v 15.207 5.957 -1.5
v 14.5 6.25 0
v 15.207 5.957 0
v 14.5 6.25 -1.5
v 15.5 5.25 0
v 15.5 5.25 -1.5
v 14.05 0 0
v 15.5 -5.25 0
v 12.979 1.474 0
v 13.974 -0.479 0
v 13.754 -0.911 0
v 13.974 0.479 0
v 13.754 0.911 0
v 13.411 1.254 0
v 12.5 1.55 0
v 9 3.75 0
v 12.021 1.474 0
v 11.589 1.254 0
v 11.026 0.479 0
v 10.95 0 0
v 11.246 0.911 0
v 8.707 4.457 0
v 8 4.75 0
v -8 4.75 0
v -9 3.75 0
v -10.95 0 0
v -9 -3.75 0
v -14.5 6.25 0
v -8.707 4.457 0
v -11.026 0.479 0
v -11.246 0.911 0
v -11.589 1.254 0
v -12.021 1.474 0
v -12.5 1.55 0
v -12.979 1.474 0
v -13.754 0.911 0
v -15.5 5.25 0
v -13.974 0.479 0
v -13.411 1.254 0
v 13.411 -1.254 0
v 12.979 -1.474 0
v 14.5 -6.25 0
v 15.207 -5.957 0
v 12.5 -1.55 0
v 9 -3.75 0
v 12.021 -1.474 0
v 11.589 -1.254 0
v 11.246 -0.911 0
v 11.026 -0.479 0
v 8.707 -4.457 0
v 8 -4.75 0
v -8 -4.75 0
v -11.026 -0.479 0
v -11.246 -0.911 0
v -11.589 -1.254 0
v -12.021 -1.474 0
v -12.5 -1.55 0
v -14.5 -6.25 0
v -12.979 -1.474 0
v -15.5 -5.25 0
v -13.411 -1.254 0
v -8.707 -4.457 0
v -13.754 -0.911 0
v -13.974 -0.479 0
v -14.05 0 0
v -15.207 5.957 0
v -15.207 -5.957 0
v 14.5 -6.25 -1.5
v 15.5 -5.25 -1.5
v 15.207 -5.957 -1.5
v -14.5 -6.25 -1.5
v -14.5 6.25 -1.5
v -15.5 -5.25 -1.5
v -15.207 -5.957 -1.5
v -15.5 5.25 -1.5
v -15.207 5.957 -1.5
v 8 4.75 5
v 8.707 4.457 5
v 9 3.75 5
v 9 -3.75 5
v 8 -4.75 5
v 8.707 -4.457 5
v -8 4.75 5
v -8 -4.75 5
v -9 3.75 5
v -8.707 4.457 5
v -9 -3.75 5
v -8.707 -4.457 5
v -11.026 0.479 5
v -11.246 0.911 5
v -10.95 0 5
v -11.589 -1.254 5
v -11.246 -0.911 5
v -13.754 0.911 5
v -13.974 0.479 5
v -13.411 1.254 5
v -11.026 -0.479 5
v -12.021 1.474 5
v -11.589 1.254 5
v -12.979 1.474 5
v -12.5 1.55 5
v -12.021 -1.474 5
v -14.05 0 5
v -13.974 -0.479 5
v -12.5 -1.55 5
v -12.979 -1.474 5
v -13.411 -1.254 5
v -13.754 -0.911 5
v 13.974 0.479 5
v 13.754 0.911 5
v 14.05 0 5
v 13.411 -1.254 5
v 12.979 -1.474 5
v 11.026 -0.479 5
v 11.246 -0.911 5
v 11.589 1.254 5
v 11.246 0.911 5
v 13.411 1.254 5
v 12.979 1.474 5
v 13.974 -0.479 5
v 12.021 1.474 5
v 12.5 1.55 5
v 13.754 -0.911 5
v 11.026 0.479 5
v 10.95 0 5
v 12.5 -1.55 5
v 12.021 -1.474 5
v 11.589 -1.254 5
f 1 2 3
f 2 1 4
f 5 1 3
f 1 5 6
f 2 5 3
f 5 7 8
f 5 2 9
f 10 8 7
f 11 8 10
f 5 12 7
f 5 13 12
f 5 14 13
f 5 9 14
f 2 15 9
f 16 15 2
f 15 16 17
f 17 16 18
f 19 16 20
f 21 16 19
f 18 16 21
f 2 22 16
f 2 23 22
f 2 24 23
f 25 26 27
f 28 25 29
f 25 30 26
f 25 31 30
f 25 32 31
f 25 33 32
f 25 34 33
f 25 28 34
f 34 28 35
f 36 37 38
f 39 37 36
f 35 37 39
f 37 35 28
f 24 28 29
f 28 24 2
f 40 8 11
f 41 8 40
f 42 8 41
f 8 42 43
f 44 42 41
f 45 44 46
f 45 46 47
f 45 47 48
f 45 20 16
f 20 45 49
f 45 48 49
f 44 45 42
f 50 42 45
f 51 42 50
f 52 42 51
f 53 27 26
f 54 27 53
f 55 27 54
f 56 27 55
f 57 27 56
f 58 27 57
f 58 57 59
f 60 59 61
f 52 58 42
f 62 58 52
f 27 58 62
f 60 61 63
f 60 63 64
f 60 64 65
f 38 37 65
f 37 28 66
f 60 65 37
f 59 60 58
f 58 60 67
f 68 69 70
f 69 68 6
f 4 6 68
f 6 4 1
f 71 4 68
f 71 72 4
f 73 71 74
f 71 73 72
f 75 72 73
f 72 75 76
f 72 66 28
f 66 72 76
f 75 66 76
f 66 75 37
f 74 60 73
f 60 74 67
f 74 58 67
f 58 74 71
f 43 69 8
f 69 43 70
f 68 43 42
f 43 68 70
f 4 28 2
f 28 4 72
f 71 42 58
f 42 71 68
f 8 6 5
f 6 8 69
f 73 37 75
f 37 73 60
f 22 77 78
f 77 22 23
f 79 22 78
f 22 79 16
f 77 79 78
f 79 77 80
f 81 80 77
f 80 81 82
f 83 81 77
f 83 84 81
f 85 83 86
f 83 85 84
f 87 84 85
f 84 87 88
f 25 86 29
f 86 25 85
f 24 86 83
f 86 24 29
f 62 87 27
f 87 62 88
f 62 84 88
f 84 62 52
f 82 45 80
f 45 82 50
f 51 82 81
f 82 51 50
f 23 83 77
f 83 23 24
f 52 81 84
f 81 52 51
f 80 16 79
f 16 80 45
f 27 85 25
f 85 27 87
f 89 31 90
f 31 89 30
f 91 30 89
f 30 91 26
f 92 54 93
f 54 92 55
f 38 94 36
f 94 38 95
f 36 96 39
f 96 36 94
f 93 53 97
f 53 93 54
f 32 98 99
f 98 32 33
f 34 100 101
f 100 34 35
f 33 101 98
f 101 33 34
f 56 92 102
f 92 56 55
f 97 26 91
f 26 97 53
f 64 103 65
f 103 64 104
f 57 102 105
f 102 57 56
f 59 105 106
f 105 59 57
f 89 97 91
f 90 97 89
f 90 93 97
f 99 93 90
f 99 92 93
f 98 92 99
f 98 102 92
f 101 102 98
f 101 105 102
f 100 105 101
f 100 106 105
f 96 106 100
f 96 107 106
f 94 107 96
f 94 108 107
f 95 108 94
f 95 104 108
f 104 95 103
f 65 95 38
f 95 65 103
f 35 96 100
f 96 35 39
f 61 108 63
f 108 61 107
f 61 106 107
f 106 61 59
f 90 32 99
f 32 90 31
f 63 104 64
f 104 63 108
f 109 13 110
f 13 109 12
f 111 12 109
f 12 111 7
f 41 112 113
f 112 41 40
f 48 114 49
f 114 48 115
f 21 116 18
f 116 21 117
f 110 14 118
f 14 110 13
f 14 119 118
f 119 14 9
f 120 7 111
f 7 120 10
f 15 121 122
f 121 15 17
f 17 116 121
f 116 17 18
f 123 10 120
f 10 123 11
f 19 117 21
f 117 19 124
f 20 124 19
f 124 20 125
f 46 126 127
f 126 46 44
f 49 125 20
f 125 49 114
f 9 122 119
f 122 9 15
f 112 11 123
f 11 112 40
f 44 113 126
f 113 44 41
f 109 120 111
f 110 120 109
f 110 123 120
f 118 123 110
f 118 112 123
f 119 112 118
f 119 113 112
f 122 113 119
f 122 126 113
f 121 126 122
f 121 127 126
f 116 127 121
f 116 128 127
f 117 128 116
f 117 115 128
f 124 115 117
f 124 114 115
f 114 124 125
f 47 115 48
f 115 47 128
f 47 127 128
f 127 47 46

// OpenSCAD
// file: ../../basics/cube_fillet.scad
// use $fn % 4 = 0;
module cube_fillet(lwh=[1,1,1], r=0.1, $fn=8, center=true) {
    $fn = ceil($fn / 4) * 4;
    
    center_translation = center ? [0,0,0] : [lwh[0] * 0.5, lwh[1] * 0.5, lwh[2] * 0.5, ];
    
    translate(center_translation){
        union(){
            //corners
            //NE
            translate([lwh[0] * 0.5 - r, lwh[1] * 0.5 - r, -lwh[2]*0.5]){ 
                cylinder(h=lwh[2], r=r, $fn=$fn);
            }
            //SE
            translate([-(lwh[0] * 0.5 - r), lwh[1] * 0.5 - r, -lwh[2]*0.5]){
                cylinder(h=lwh[2], r=r, $fn=$fn);
            }
            //NE
            translate([-(lwh[0] * 0.5 - r), -(lwh[1] * 0.5 - r), -lwh[2]*0.5]){
                cylinder(h=lwh[2], r=r, $fn=$fn);
            }
            //SE
            translate([lwh[0] * 0.5 - r, -(lwh[1] * 0.5 - r), -lwh[2]*0.5]){
                cylinder(h=lwh[2], r=r, $fn=$fn);
            }
            
            // boxes
            cube([lwh[0] - 2*r, lwh[1], lwh[2]], true);
            cube([lwh[0], lwh[1] - 2*r, lwh[2]], true);
        };
    }
};

cube_fillet(center=false);
// main file
use <../../basics/cube_fillet.scad>;
module db9_negative(){
    union(){
        //baseplate
        translate([0,0,-0.75]){
            cube_fillet([31,12.5,1.5], 1);
        }

        //connector

        translate([0,0,2.5]){
            cube_fillet([18, 9.5, 5], 1);
        }

        //mount holes
        translate([-12.5, 0, 0]){
            cylinder(h=5, r=1.55, $fn=20);
        }
        translate([12.5, 0, 0]){
            cylinder(h=5, r=1.55, $fn=20);
        }
    }
}

db9_negative();
